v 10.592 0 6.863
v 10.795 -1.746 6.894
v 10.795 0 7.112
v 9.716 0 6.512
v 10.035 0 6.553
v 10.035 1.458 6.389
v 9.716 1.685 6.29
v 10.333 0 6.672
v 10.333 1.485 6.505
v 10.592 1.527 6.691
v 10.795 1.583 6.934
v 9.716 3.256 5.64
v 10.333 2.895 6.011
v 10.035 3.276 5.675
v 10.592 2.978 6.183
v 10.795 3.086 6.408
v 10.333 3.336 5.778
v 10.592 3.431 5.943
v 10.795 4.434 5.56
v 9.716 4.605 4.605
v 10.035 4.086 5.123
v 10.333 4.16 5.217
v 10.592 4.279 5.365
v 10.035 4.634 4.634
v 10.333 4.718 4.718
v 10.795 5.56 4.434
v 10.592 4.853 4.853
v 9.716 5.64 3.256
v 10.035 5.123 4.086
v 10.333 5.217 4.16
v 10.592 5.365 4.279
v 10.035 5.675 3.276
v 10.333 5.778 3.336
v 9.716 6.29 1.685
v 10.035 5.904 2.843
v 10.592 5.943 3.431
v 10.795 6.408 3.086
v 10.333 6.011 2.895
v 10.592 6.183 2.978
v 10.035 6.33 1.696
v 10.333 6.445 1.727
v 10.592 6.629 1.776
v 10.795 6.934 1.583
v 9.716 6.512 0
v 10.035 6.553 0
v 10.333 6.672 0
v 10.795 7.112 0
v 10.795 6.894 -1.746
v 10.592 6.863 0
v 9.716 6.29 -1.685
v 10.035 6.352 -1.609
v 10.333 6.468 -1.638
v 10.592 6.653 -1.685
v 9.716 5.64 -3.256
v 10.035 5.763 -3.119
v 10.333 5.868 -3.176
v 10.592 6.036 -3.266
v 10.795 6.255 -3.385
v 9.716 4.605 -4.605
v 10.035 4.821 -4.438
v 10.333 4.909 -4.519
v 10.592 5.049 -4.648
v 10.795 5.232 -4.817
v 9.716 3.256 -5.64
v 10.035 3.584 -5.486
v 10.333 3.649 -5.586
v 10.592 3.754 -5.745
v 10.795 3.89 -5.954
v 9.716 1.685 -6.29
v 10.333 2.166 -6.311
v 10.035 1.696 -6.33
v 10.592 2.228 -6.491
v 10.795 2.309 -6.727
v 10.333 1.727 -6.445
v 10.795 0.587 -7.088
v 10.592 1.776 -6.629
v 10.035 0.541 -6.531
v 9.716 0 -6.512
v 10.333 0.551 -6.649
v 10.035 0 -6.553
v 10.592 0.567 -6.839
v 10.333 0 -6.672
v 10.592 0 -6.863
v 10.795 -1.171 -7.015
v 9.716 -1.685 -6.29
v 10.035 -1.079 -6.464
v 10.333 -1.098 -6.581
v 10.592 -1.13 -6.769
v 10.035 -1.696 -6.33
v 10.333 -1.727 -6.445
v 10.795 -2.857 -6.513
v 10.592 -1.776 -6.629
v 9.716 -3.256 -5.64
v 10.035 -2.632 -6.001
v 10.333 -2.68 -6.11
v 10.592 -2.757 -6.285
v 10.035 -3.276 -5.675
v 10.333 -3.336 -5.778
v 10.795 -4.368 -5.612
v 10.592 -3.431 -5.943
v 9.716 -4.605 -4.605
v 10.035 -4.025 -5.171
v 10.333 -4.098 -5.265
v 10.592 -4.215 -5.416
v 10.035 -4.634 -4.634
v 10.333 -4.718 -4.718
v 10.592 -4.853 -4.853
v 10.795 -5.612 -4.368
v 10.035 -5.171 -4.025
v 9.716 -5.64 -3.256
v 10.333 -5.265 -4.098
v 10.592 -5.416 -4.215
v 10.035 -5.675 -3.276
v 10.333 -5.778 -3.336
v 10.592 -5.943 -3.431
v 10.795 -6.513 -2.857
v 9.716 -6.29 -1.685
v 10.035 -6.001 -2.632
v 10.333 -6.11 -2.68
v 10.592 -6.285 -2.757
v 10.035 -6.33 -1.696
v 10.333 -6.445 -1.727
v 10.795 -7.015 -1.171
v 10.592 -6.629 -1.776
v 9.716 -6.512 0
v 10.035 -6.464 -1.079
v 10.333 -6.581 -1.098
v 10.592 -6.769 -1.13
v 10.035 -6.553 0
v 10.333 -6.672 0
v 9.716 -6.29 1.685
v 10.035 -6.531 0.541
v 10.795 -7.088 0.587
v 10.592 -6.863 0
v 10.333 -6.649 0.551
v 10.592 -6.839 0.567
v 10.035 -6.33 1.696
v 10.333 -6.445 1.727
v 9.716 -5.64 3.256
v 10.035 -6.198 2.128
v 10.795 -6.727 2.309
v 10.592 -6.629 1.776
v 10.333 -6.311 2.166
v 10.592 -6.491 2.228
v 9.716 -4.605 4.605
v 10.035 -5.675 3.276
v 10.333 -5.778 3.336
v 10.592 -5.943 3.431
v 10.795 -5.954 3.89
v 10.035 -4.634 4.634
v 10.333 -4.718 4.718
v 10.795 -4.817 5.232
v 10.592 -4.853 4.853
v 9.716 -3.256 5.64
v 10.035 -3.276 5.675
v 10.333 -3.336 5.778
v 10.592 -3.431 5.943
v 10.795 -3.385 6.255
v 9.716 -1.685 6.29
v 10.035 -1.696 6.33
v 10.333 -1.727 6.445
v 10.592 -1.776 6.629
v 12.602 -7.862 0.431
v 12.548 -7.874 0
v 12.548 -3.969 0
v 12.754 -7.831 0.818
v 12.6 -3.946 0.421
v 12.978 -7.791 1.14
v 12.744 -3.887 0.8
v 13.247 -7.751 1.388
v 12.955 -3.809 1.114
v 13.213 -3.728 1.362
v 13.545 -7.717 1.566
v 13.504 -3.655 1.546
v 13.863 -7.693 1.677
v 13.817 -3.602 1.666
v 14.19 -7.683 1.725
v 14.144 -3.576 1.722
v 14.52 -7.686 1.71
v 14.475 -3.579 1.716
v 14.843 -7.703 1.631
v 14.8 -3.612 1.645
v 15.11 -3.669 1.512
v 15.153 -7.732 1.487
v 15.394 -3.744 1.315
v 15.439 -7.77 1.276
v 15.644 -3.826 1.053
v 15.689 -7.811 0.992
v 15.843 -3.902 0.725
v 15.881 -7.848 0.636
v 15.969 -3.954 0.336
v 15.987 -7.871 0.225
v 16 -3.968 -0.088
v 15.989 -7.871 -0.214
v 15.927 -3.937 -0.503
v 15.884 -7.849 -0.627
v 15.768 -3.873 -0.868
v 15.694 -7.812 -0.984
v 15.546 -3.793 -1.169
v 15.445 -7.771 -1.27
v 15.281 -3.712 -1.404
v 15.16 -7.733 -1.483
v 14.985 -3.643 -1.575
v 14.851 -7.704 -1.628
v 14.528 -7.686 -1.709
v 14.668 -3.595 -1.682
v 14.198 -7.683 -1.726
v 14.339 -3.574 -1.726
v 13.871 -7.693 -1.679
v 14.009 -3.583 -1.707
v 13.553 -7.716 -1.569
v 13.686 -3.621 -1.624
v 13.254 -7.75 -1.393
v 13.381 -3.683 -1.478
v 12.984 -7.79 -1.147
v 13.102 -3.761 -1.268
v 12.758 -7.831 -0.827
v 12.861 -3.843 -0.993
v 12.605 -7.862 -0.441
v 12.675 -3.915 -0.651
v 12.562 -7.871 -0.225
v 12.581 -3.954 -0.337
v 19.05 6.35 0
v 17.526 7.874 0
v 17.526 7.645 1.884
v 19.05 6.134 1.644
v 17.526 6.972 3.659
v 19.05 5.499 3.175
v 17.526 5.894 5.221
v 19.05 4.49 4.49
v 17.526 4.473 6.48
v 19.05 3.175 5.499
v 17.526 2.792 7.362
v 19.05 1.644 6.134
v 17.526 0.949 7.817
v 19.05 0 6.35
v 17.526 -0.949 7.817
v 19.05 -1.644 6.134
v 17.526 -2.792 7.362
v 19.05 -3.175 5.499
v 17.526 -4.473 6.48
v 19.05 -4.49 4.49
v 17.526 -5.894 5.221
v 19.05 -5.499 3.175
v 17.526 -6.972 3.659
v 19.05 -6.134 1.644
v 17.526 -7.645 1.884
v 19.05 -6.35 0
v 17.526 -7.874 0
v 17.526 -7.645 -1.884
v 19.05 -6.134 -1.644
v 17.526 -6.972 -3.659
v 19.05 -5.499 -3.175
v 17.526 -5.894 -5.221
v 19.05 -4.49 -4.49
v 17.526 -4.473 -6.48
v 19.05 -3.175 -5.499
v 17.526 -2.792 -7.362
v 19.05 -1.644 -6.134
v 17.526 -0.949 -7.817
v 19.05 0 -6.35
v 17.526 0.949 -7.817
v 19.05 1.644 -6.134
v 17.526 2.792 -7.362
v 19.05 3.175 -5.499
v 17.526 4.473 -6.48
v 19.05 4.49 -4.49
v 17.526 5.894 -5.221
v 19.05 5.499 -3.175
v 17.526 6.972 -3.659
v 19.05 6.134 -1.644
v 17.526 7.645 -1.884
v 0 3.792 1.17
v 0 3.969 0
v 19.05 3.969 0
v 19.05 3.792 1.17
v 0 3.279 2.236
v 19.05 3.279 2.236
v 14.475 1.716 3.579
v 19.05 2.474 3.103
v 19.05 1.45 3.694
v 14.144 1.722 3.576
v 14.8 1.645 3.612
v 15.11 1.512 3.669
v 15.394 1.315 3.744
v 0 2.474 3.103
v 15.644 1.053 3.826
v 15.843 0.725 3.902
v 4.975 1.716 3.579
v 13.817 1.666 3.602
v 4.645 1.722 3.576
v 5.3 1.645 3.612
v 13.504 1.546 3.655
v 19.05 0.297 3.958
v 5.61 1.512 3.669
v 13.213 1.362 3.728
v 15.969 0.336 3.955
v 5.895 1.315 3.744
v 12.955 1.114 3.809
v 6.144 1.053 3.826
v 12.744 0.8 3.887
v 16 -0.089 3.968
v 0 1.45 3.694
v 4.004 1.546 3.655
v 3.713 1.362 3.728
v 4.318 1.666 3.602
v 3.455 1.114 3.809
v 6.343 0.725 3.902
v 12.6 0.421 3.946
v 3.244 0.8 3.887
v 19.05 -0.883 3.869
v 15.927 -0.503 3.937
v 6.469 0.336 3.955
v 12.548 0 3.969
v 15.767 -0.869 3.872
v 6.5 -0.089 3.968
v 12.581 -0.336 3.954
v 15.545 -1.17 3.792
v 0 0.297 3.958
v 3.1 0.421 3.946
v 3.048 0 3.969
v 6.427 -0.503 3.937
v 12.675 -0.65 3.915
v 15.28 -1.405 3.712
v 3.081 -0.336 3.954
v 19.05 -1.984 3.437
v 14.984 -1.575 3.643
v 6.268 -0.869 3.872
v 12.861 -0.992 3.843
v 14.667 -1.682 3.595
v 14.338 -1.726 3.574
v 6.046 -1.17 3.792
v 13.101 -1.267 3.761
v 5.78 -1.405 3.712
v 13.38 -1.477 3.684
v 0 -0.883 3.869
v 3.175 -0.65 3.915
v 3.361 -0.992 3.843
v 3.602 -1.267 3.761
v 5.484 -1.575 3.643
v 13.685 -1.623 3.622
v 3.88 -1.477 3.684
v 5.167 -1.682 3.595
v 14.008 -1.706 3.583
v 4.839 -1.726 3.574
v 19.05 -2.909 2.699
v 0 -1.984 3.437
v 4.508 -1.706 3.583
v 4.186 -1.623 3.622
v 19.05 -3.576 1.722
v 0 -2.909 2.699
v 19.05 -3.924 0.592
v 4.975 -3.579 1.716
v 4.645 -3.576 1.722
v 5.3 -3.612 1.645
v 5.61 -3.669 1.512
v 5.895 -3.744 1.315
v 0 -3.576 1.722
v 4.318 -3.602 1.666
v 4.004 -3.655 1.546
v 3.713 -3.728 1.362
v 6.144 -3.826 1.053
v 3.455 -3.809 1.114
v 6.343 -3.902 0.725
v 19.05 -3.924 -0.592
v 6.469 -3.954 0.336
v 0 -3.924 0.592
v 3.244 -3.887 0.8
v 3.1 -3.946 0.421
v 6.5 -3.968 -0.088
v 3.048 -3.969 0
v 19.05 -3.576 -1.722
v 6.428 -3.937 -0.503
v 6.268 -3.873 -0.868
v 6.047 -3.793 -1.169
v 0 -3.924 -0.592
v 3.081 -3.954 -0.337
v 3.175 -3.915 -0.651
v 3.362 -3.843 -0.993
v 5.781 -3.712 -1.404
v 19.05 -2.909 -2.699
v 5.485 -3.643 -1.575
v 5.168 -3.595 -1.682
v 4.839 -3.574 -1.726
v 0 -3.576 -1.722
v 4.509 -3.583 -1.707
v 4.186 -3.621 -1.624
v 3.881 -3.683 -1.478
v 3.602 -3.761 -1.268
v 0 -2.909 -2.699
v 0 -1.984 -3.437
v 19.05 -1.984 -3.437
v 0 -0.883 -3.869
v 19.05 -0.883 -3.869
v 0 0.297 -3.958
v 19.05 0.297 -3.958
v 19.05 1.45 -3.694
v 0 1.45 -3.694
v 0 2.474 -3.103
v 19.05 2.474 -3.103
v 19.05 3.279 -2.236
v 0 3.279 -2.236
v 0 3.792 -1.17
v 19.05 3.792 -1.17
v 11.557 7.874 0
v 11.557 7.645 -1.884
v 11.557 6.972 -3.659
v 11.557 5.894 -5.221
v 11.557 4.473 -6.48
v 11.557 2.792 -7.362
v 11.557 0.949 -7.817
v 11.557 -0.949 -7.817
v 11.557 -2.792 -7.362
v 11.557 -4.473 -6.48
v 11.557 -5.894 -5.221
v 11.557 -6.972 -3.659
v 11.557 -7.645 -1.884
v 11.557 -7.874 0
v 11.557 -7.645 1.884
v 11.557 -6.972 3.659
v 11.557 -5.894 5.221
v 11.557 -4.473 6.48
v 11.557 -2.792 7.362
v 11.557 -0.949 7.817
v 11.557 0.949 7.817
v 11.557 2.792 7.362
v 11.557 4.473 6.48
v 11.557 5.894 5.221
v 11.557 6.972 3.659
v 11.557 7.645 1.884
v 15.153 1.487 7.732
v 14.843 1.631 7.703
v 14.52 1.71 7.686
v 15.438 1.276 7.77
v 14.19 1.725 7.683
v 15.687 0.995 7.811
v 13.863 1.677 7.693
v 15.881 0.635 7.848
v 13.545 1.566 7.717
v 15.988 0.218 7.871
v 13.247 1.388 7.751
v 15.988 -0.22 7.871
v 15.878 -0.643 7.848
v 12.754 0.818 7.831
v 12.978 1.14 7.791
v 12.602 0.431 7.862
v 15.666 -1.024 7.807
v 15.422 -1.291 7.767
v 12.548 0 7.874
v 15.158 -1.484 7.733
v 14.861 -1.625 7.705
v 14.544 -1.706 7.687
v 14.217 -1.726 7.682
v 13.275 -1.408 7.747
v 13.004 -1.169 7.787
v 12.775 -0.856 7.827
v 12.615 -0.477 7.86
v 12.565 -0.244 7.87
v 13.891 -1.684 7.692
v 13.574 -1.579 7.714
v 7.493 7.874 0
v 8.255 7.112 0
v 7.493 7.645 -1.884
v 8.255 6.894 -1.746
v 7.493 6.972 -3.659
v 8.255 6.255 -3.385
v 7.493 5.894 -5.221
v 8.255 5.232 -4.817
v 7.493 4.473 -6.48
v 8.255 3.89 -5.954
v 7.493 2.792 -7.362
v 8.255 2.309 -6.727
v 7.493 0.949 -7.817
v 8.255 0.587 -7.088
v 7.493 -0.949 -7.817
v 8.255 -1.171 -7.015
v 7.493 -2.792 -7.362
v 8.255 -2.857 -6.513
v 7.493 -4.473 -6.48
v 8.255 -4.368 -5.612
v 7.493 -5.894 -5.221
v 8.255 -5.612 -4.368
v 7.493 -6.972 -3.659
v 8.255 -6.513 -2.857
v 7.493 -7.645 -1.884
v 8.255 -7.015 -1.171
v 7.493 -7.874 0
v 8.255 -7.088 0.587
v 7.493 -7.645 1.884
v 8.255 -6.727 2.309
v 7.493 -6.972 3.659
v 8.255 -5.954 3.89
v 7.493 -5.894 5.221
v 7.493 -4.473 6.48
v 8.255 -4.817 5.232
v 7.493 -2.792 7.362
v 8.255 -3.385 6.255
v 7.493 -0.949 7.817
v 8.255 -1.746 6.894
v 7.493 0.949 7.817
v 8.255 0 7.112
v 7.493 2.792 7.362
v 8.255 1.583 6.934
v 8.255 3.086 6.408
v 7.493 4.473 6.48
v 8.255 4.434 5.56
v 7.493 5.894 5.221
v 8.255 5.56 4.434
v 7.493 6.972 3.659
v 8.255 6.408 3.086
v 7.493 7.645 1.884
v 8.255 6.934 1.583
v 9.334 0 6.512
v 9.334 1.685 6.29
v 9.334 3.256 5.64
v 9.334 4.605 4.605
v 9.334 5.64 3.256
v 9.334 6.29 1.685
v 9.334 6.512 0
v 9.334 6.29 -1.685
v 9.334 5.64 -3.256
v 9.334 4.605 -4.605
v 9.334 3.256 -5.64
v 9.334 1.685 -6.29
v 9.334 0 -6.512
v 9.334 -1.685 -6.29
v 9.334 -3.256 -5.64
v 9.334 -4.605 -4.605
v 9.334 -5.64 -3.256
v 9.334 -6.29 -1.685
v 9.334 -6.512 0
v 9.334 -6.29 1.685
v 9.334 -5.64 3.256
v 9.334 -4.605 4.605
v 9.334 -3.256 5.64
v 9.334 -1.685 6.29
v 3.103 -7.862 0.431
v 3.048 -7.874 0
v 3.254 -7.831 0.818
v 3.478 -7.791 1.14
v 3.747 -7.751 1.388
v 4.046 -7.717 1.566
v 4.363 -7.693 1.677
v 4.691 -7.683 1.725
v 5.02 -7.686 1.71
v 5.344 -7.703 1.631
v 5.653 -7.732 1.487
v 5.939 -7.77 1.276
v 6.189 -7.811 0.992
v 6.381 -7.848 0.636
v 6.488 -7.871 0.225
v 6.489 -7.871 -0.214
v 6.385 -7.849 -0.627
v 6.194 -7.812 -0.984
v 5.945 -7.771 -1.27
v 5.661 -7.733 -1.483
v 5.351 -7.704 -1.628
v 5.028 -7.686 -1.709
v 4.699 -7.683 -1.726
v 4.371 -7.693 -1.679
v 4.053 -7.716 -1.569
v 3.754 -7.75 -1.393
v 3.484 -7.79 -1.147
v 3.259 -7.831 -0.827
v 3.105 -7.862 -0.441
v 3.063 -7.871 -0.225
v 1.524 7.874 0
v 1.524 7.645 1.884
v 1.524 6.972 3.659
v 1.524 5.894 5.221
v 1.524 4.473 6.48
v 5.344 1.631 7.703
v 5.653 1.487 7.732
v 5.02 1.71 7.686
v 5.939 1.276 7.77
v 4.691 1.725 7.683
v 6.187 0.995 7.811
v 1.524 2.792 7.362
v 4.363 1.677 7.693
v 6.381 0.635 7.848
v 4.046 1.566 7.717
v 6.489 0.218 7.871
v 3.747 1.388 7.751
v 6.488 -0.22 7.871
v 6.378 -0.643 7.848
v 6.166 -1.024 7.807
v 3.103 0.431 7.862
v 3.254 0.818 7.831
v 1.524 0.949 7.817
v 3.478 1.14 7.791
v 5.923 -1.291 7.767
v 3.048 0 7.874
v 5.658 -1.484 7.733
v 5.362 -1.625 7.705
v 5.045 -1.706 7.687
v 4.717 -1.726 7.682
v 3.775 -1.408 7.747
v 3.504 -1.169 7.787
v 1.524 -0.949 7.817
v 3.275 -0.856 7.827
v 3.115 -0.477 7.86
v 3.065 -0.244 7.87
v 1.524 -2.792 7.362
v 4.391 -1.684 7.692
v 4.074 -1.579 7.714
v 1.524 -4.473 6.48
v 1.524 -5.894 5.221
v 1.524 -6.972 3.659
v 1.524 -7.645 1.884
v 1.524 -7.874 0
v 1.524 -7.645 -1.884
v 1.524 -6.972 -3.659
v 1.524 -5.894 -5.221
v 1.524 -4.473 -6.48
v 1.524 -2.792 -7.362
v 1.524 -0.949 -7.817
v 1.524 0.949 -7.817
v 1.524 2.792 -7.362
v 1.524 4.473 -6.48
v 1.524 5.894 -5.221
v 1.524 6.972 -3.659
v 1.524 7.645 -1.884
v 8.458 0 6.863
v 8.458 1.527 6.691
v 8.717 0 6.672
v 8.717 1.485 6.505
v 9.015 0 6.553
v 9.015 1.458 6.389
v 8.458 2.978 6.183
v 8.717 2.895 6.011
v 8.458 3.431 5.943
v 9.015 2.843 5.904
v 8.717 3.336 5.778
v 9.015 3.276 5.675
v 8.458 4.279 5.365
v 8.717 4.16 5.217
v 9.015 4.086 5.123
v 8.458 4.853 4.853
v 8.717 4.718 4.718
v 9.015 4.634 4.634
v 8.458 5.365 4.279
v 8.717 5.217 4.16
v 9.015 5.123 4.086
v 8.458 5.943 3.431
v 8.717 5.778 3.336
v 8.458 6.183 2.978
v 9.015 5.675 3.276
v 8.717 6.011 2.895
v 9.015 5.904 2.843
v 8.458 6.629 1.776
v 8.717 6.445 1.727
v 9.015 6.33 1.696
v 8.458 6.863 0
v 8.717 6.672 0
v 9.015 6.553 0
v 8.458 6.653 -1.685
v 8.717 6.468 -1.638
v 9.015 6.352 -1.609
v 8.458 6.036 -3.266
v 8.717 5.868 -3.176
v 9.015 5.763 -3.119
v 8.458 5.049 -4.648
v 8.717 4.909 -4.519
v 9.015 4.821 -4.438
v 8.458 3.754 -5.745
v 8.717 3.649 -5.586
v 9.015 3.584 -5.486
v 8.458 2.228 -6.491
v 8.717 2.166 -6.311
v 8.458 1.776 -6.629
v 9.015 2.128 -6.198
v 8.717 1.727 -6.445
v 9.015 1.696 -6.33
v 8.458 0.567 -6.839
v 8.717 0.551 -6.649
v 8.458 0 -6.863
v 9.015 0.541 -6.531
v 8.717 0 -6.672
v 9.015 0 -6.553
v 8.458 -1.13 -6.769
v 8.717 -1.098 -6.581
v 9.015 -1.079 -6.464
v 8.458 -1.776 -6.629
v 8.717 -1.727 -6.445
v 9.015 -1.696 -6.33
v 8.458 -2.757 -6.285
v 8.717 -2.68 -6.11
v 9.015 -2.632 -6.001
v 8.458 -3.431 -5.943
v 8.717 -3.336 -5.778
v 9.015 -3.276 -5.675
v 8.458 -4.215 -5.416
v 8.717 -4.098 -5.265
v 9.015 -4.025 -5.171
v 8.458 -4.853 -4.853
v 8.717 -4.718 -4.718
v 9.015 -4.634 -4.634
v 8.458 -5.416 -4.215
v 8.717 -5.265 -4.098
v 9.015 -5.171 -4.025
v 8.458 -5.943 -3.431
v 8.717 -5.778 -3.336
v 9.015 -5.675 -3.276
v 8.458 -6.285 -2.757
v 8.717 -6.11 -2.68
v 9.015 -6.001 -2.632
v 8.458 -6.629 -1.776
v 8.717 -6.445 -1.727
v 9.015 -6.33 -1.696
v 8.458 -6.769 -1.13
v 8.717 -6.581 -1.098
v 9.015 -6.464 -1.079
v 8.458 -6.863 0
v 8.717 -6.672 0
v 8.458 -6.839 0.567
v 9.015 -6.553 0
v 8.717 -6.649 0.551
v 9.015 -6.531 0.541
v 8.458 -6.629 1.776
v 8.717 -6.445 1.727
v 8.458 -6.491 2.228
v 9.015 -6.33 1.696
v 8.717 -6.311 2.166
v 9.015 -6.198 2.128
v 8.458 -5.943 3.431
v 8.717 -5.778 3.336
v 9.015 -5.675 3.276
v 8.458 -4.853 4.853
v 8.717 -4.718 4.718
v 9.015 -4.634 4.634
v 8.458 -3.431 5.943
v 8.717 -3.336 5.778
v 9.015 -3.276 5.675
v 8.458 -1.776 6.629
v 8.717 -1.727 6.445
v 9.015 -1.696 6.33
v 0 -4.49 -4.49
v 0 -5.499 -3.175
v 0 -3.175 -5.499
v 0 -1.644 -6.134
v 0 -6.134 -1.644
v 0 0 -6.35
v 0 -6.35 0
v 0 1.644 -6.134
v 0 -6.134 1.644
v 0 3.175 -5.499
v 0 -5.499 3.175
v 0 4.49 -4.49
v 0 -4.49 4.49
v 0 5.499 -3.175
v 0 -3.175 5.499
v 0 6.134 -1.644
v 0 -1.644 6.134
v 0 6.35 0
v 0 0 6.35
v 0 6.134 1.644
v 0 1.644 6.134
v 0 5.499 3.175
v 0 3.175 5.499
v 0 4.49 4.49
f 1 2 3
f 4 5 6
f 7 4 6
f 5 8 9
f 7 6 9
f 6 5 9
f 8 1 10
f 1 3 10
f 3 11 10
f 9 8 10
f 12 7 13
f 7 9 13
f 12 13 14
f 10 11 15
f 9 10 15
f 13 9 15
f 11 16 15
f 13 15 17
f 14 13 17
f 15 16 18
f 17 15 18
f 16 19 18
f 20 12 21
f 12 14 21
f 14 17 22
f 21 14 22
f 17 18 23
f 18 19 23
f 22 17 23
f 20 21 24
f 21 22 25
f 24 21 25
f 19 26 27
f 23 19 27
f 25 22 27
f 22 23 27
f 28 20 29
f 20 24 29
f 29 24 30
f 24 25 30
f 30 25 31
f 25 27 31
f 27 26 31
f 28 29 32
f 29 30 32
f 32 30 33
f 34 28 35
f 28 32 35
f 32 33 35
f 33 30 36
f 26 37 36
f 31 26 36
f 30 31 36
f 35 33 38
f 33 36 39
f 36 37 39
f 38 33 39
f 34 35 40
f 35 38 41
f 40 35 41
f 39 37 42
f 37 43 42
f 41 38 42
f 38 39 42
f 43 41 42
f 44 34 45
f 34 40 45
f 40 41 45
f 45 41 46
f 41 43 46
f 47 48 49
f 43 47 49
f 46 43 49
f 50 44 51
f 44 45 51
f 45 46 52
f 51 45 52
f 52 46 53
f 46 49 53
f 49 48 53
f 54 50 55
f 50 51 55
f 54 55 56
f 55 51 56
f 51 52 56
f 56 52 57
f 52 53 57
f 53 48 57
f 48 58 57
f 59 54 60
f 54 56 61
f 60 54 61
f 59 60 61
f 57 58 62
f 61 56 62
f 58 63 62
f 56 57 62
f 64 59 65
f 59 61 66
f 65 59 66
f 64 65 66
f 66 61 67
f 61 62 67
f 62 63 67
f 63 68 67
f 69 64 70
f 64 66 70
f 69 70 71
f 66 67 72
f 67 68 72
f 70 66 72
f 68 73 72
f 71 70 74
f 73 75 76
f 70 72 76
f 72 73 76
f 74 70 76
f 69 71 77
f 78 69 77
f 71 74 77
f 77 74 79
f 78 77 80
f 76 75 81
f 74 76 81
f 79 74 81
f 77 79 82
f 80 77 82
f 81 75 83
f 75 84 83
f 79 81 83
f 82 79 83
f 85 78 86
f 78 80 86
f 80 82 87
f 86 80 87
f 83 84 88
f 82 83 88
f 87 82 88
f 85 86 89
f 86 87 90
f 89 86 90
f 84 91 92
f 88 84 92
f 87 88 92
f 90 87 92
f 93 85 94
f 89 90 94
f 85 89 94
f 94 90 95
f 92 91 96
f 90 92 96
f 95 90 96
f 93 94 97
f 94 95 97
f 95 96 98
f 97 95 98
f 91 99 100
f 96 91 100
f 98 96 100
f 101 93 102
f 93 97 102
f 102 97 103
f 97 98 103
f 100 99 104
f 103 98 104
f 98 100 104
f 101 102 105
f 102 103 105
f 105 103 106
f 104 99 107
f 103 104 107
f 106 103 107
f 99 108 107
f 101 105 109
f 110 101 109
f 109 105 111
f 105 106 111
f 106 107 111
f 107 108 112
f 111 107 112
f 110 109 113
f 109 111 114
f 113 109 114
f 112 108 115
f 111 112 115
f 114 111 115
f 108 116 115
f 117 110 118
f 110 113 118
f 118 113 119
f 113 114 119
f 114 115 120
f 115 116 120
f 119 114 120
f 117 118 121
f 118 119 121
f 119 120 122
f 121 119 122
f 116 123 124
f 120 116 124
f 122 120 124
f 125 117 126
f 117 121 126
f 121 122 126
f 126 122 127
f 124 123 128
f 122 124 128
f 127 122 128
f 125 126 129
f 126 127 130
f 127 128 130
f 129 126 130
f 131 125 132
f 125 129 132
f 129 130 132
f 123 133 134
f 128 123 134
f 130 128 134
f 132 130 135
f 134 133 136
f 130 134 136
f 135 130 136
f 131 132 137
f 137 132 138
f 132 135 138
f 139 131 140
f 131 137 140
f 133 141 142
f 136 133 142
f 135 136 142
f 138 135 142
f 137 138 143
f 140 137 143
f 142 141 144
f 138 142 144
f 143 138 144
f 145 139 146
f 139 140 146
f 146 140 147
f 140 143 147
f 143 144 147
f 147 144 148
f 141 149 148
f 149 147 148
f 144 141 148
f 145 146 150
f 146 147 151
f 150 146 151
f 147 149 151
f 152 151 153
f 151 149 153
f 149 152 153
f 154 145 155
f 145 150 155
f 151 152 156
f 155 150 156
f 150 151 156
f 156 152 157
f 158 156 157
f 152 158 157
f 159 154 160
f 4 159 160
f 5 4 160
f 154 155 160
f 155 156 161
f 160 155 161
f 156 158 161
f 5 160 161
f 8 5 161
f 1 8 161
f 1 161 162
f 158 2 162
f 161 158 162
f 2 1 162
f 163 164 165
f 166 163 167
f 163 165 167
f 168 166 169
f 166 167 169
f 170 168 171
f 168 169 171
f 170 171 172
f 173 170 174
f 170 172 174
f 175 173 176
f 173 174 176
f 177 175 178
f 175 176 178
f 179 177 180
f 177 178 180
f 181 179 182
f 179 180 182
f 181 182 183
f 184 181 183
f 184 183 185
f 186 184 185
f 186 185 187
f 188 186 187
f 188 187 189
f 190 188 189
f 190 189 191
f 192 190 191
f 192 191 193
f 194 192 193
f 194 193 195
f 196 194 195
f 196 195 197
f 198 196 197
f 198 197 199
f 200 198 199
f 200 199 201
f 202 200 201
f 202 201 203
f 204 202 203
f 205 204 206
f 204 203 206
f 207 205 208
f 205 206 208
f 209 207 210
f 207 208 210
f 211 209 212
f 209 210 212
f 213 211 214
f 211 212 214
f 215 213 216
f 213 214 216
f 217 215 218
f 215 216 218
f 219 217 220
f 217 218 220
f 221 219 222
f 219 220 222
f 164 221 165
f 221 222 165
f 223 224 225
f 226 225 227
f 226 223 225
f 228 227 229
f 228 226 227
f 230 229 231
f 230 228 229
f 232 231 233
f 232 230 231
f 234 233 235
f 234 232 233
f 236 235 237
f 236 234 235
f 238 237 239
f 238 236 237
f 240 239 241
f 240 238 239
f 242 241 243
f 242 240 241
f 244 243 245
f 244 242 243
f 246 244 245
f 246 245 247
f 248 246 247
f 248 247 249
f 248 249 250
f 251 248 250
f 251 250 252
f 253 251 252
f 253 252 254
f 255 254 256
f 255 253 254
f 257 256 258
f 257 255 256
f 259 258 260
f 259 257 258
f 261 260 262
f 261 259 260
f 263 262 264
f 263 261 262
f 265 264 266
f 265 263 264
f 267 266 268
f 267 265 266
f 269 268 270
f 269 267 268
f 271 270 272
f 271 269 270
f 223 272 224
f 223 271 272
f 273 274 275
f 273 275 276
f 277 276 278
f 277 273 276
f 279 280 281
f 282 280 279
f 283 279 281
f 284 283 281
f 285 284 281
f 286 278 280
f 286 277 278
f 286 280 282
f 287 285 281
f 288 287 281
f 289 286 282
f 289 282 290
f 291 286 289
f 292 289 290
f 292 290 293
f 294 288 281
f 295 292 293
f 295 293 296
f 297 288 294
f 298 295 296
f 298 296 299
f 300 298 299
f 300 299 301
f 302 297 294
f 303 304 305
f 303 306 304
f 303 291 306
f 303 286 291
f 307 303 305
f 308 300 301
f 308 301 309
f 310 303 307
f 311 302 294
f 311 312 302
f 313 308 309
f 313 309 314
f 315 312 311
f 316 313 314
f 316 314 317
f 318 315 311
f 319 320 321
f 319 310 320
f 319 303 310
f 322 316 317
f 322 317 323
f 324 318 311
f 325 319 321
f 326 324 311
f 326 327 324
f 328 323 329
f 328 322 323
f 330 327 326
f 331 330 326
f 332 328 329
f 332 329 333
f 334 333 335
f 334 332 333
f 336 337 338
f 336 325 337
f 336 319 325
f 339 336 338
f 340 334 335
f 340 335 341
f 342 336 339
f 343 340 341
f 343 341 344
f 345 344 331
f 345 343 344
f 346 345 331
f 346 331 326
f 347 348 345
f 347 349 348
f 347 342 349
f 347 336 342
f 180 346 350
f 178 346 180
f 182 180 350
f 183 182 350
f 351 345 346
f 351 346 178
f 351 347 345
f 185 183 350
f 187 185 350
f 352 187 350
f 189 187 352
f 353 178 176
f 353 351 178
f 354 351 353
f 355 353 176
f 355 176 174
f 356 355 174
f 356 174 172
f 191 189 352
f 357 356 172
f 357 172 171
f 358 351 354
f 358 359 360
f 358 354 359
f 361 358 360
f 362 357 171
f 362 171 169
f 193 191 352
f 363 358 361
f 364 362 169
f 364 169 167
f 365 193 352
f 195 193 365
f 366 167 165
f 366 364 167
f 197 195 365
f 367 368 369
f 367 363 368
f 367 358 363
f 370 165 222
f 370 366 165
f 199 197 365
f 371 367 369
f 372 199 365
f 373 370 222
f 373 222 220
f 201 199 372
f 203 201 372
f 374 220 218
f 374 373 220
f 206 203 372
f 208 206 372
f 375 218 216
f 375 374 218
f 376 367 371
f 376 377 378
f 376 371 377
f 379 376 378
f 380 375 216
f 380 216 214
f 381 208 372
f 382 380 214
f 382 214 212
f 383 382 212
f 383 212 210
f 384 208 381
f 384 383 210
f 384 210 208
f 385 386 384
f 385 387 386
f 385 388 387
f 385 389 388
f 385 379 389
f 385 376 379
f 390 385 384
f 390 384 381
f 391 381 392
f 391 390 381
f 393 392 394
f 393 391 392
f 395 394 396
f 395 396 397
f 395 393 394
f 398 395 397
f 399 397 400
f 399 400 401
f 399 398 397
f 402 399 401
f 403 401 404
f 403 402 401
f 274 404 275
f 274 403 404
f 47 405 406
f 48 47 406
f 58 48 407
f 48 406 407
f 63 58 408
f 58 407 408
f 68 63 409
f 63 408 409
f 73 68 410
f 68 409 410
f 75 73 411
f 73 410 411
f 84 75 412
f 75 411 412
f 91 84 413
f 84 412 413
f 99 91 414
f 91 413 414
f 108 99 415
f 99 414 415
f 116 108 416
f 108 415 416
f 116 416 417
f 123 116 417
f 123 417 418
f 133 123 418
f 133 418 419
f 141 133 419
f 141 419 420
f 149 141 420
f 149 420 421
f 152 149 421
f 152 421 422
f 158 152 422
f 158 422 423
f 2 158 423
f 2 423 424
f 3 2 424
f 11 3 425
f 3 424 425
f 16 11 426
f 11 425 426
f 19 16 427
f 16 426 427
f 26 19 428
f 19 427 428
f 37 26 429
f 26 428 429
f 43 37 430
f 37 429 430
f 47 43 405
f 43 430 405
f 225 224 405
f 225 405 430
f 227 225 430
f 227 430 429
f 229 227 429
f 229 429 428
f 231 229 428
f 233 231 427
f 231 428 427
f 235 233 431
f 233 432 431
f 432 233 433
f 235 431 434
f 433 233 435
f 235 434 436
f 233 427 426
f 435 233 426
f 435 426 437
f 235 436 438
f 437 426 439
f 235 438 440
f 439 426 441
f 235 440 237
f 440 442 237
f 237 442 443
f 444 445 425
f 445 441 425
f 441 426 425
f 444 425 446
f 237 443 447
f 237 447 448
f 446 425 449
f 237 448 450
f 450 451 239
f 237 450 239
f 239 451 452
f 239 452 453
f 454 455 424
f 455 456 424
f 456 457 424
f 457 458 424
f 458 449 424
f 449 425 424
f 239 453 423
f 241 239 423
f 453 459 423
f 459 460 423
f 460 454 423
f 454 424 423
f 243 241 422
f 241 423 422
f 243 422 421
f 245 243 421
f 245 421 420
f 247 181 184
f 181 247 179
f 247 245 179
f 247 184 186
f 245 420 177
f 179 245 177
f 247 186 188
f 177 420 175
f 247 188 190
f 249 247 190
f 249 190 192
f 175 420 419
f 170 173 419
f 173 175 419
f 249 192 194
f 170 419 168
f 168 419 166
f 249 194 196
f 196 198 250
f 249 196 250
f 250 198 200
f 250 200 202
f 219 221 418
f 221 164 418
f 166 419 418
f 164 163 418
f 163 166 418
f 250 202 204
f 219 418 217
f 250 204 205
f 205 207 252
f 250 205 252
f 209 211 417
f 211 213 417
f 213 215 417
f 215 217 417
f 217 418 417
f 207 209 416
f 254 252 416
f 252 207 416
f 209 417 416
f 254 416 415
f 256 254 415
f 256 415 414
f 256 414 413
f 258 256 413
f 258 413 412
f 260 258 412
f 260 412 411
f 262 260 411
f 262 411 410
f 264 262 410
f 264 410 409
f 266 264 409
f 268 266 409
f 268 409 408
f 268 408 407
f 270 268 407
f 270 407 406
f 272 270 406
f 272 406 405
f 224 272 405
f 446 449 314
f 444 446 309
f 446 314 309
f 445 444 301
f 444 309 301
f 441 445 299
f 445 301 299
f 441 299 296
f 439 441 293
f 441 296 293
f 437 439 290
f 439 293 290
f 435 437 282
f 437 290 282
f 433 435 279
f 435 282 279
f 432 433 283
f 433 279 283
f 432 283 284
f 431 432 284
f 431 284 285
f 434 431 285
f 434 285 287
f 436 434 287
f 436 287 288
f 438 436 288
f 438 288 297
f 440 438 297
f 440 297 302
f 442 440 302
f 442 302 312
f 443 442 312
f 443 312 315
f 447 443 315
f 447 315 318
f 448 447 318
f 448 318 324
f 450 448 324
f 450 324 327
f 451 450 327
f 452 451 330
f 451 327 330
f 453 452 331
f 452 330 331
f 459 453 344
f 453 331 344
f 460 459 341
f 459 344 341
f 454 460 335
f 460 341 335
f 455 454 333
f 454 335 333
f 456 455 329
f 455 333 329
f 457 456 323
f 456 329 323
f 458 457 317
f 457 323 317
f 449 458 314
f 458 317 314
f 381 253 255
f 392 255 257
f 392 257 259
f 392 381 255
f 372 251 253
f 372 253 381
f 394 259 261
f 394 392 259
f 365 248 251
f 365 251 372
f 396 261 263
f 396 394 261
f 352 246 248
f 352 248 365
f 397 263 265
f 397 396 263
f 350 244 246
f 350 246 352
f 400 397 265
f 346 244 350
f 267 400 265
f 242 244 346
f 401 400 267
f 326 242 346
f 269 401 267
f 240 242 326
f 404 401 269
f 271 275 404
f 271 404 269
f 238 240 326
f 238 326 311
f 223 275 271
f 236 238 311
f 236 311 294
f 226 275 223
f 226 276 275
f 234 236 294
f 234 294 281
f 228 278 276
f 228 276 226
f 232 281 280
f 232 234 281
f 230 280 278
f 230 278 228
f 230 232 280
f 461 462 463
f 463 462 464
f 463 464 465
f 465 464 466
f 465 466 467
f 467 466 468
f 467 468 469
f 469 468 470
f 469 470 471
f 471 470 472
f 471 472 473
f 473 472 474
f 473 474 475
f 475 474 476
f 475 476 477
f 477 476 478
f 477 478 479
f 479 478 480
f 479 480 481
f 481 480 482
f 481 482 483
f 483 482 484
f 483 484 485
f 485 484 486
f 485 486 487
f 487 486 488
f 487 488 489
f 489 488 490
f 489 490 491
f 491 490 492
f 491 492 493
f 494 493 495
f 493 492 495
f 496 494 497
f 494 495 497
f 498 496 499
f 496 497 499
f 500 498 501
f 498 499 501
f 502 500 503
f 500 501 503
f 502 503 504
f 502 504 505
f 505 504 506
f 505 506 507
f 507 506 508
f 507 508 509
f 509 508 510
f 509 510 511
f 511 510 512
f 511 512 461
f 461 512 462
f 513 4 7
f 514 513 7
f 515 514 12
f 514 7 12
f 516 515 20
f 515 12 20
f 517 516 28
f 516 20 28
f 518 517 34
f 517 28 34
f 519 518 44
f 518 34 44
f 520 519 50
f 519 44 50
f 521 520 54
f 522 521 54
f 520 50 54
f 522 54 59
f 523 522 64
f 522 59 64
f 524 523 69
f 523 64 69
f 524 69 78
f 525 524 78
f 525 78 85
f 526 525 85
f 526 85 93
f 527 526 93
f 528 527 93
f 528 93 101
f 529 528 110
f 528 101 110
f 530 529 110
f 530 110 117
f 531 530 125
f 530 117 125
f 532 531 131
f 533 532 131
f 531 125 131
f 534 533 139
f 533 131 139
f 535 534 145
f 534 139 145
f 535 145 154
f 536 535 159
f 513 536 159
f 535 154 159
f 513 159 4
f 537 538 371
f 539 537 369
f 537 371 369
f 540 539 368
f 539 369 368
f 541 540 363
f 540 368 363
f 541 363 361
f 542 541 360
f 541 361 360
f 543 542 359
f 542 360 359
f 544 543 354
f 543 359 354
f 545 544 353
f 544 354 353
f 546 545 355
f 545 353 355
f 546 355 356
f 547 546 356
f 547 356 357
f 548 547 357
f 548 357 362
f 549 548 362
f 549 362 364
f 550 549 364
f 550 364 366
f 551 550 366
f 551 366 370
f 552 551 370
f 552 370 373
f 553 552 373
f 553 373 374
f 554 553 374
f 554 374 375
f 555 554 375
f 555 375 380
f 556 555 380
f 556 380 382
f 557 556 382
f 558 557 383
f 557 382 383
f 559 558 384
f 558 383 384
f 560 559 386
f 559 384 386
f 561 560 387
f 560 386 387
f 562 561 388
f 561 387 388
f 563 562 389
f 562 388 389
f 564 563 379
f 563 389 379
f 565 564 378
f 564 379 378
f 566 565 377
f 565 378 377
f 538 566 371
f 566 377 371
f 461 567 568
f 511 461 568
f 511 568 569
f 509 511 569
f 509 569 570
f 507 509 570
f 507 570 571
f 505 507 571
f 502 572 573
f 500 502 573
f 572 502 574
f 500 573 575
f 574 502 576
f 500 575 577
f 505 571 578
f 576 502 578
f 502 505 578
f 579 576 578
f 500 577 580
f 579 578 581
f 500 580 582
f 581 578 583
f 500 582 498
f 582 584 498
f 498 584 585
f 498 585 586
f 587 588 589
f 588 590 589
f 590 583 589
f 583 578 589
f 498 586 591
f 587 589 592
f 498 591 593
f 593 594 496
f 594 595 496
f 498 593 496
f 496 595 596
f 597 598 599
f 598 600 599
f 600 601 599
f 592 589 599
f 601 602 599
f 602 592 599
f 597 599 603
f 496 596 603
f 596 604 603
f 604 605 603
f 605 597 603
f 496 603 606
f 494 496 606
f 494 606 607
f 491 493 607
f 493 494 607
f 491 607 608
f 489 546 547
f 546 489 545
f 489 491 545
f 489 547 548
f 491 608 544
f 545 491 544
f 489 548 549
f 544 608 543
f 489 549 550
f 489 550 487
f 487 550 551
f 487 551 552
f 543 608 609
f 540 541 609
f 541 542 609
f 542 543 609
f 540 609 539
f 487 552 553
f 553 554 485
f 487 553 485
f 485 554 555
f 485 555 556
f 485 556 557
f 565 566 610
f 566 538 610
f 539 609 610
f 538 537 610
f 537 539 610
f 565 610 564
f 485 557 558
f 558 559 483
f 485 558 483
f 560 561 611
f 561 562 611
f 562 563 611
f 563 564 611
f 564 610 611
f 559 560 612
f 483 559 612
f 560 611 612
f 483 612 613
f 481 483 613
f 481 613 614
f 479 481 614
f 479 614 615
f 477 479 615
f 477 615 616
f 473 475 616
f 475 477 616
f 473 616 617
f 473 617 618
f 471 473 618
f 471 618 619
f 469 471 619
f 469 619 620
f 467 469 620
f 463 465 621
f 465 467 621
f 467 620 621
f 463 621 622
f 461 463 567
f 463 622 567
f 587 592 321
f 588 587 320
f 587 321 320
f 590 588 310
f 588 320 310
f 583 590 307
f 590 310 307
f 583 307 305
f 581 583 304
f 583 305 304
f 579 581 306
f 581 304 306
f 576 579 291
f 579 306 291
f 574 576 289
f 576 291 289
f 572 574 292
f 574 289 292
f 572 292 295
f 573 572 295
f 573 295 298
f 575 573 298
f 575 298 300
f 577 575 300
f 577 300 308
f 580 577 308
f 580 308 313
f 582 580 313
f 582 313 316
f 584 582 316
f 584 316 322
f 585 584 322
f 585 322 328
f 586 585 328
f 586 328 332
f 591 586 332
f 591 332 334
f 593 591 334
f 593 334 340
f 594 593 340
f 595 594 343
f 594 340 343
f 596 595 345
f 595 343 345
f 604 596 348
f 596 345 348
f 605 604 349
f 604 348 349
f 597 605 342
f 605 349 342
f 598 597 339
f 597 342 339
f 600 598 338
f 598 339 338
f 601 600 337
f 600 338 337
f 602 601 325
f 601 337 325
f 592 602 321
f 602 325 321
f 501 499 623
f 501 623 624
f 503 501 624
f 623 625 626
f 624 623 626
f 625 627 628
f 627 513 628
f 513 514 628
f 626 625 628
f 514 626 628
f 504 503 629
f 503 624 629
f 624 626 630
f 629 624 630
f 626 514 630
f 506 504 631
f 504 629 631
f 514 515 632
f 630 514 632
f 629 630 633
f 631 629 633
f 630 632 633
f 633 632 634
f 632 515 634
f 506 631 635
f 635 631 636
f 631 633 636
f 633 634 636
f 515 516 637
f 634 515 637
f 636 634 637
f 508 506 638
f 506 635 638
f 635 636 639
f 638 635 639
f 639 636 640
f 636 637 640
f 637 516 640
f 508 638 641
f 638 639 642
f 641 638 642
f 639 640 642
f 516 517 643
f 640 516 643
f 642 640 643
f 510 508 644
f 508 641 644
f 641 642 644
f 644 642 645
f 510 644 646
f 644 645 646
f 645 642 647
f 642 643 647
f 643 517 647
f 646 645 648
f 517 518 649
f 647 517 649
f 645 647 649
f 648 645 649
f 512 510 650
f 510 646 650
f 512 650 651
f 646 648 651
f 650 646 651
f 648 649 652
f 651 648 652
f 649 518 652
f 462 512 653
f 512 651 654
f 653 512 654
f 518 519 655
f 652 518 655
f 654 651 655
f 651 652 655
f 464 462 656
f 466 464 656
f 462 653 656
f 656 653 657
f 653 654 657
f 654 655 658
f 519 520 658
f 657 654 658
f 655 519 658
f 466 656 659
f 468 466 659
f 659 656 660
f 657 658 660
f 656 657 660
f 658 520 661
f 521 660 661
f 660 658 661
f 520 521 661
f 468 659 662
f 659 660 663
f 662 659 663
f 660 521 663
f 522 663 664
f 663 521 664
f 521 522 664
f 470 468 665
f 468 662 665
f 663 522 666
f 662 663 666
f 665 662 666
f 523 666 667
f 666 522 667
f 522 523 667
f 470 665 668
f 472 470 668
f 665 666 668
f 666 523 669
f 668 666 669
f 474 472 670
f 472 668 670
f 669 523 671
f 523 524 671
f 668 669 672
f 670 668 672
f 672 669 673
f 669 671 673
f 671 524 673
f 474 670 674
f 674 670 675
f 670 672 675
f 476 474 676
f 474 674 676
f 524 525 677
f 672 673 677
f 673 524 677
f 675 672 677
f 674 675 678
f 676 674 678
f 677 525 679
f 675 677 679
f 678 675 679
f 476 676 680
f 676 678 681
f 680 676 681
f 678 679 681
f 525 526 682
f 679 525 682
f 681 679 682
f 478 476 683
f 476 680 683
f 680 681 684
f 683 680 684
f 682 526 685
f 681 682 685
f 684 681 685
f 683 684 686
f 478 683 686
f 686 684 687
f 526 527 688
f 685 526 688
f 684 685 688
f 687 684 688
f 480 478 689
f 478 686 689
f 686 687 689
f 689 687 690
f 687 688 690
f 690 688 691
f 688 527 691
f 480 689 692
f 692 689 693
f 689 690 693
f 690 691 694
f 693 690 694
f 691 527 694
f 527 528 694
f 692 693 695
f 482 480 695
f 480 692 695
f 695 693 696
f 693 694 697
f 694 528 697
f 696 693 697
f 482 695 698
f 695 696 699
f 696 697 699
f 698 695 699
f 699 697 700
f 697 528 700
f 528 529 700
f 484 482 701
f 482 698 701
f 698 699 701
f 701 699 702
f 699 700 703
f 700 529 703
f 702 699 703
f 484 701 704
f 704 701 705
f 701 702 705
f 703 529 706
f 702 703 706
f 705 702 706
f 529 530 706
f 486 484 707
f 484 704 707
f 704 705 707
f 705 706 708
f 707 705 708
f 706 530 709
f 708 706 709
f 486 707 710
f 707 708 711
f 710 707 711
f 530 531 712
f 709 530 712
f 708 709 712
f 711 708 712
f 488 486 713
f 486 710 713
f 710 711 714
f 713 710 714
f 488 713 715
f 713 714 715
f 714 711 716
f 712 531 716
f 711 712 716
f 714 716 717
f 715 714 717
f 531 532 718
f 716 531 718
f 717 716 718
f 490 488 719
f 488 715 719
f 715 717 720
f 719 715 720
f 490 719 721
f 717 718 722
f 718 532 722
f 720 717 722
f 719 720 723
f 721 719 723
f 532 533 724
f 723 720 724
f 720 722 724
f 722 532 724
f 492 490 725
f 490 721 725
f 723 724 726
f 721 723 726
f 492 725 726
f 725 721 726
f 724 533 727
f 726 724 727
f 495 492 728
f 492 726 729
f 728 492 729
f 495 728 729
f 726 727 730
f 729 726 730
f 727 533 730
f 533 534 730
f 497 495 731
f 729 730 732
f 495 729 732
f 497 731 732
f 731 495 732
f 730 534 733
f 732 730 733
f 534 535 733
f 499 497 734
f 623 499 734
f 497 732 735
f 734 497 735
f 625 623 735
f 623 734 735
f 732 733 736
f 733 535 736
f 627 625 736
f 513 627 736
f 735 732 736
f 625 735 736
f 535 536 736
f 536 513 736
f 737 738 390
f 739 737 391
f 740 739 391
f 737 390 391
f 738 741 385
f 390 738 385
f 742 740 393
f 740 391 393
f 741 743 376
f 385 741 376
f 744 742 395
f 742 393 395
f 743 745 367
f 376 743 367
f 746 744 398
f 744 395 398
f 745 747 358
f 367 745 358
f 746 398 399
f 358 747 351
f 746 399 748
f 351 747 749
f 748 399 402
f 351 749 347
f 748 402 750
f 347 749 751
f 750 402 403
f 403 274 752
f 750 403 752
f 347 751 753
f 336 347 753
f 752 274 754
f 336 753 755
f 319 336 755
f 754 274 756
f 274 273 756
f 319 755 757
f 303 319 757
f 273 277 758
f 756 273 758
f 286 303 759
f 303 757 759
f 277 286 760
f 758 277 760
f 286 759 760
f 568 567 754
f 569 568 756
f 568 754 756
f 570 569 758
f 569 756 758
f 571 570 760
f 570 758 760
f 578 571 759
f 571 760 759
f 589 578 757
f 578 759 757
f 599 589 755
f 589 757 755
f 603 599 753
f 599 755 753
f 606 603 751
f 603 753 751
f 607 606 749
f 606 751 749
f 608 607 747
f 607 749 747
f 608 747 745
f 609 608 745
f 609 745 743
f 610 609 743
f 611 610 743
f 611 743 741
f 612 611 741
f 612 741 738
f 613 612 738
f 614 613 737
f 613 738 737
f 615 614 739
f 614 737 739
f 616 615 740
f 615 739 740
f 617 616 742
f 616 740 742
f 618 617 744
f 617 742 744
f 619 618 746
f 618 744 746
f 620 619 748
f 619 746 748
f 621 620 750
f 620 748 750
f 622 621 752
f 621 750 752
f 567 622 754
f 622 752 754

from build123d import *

# Parameters (mm, degrees)
F0_R      = 7.874
F0_R_2    = 3.96875
F1_DEPTH  = 19.05
F2_SIZE2  = 1.524
F2_SIZE   = 1.524
F5_D      = 3.4544
F5_DEPTH  = 9.49325
F5_START  = 0.9537702
F5_TIP    = 1.0378064612
F8_D      = 3.4544
F8_DEPTH  = 9.4996
F8_START  = 0.9537702
F8_TIP    = 1.0378064612
F11_SIZE2 = 0.762
F11_SIZE  = 0.762


# Not quite as in the source:
# - a fillet or chamfer that OpenCascade refuses, or shapes differently, is made with other operations: its cross-section is extruded or revolved along the edge and cut away or added


with BuildPart() as f1:
    # F0 (on Right) → F1 (new body)
    with BuildSketch(Plane.YZ):
        Circle(F0_R)
        Circle(F0_R_2, mode=Mode.SUBTRACT)
    extrude(amount=F1_DEPTH)

    # F2
    f2_edges = [f1.edges().sort_by_distance(p)[0] for p in [
        (19.05, -7.874, 0),
        (0, -7.874, 0),
    ]]
    chamfer(f2_edges, length=F2_SIZE, length2=F2_SIZE2)

    # F5
    # its depths count from where the whole tool has entered the part; down to there all is cleared
    with Locations(Plane.XY.offset(8.636).offset(-F5_START)):
        with Locations((4.7752, 0), (14.2748, 0)):
            Hole(F5_D / 2, depth=F5_DEPTH)
            with Locations((0, 0, -(F5_DEPTH + F5_TIP / 2))):  # 118° drill point
                Cone(0, F5_D / 2, F5_TIP, mode=Mode.SUBTRACT)

    # F8
    # its depths count from where the whole tool has entered the part; down to there all is cleared
    with Locations(Plane.XZ.offset(8.636).offset(-F8_START)):
        with Locations((4.7752, 0), (14.2748, 0)):
            Hole(F8_D / 2, depth=F8_DEPTH)
            with Locations((0, 0, -(F8_DEPTH + F8_TIP / 2))):  # 118° drill point
                Cone(0, F8_D / 2, F8_TIP, mode=Mode.SUBTRACT)

    # F9 (on Front) → F10 (revolve, cut)
    with BuildSketch(Plane.XZ):
        Polygon((10.795, 8.9425863698), (9.525, 8.9425863698), (8.255, 8.9425863698), (8.255, 6.5122395754), (10.795, 6.5122395754), align=None)
    revolve(axis=Axis((-2.5821820018, 0, 0), (-1, 0, 0)), mode=Mode.SUBTRACT)

    # F11
    f11_edges = [f1.edges().sort_by_distance(p)[0] for p in [
        (8.255, -7.874, 0),
        (10.795, -7.874, 0),
    ]]
    chamfer(f11_edges, length=F11_SIZE, length2=F11_SIZE2)

    # F12: fillet of radius 1.27 on 2 edges, made by hand

    # F12_s1 → F12_t2 (revolve)
    with BuildSketch(Plane.XZ):
        with BuildLine():
            ThreePointArc((8.255, 7.112), (8.7166107711, 6.6722611385), (9.3337395013, 6.5122395754))
            Line((9.3337395013, 6.5122395754), (9.3337395013, 6.4868395754))
            Line((9.3337395013, 6.4868395754), (8.255, 6.4868395754))
            Line((8.255, 6.4868395754), (8.2296, 6.5122395754))
            ThreePointArc((8.2296, 6.5122395754), (8.2296, 6.8121197877), (8.23342521, 7.0985952085))
            Line((8.23342521, 7.0985952085), (8.255, 7.112))
        make_face()
    revolve(axis=Axis((8.255, 0, 0), (-1, 0, 0)))

    # F12_s3 → F12_t4 (revolve)
    with BuildSketch(Plane.XZ):
        with BuildLine():
            ThreePointArc((9.7162604987, 6.5122395754), (10.3333892289, 6.6722611385), (10.795, 7.112))
            Line((10.795, 7.112), (10.81657479, 7.0985952085))
            ThreePointArc((10.81657479, 7.0985952085), (10.8204, 6.8121197877), (10.8204, 6.5122395754))
            Line((10.8204, 6.5122395754), (10.795, 6.4868395754))
            Line((10.795, 6.4868395754), (9.7162604987, 6.4868395754))
            Line((9.7162604987, 6.4868395754), (9.7162604987, 6.5122395754))
        make_face()
    revolve(axis=Axis((10.795, 0, 0), (-1, 0, 0)))


solid = f1.part
